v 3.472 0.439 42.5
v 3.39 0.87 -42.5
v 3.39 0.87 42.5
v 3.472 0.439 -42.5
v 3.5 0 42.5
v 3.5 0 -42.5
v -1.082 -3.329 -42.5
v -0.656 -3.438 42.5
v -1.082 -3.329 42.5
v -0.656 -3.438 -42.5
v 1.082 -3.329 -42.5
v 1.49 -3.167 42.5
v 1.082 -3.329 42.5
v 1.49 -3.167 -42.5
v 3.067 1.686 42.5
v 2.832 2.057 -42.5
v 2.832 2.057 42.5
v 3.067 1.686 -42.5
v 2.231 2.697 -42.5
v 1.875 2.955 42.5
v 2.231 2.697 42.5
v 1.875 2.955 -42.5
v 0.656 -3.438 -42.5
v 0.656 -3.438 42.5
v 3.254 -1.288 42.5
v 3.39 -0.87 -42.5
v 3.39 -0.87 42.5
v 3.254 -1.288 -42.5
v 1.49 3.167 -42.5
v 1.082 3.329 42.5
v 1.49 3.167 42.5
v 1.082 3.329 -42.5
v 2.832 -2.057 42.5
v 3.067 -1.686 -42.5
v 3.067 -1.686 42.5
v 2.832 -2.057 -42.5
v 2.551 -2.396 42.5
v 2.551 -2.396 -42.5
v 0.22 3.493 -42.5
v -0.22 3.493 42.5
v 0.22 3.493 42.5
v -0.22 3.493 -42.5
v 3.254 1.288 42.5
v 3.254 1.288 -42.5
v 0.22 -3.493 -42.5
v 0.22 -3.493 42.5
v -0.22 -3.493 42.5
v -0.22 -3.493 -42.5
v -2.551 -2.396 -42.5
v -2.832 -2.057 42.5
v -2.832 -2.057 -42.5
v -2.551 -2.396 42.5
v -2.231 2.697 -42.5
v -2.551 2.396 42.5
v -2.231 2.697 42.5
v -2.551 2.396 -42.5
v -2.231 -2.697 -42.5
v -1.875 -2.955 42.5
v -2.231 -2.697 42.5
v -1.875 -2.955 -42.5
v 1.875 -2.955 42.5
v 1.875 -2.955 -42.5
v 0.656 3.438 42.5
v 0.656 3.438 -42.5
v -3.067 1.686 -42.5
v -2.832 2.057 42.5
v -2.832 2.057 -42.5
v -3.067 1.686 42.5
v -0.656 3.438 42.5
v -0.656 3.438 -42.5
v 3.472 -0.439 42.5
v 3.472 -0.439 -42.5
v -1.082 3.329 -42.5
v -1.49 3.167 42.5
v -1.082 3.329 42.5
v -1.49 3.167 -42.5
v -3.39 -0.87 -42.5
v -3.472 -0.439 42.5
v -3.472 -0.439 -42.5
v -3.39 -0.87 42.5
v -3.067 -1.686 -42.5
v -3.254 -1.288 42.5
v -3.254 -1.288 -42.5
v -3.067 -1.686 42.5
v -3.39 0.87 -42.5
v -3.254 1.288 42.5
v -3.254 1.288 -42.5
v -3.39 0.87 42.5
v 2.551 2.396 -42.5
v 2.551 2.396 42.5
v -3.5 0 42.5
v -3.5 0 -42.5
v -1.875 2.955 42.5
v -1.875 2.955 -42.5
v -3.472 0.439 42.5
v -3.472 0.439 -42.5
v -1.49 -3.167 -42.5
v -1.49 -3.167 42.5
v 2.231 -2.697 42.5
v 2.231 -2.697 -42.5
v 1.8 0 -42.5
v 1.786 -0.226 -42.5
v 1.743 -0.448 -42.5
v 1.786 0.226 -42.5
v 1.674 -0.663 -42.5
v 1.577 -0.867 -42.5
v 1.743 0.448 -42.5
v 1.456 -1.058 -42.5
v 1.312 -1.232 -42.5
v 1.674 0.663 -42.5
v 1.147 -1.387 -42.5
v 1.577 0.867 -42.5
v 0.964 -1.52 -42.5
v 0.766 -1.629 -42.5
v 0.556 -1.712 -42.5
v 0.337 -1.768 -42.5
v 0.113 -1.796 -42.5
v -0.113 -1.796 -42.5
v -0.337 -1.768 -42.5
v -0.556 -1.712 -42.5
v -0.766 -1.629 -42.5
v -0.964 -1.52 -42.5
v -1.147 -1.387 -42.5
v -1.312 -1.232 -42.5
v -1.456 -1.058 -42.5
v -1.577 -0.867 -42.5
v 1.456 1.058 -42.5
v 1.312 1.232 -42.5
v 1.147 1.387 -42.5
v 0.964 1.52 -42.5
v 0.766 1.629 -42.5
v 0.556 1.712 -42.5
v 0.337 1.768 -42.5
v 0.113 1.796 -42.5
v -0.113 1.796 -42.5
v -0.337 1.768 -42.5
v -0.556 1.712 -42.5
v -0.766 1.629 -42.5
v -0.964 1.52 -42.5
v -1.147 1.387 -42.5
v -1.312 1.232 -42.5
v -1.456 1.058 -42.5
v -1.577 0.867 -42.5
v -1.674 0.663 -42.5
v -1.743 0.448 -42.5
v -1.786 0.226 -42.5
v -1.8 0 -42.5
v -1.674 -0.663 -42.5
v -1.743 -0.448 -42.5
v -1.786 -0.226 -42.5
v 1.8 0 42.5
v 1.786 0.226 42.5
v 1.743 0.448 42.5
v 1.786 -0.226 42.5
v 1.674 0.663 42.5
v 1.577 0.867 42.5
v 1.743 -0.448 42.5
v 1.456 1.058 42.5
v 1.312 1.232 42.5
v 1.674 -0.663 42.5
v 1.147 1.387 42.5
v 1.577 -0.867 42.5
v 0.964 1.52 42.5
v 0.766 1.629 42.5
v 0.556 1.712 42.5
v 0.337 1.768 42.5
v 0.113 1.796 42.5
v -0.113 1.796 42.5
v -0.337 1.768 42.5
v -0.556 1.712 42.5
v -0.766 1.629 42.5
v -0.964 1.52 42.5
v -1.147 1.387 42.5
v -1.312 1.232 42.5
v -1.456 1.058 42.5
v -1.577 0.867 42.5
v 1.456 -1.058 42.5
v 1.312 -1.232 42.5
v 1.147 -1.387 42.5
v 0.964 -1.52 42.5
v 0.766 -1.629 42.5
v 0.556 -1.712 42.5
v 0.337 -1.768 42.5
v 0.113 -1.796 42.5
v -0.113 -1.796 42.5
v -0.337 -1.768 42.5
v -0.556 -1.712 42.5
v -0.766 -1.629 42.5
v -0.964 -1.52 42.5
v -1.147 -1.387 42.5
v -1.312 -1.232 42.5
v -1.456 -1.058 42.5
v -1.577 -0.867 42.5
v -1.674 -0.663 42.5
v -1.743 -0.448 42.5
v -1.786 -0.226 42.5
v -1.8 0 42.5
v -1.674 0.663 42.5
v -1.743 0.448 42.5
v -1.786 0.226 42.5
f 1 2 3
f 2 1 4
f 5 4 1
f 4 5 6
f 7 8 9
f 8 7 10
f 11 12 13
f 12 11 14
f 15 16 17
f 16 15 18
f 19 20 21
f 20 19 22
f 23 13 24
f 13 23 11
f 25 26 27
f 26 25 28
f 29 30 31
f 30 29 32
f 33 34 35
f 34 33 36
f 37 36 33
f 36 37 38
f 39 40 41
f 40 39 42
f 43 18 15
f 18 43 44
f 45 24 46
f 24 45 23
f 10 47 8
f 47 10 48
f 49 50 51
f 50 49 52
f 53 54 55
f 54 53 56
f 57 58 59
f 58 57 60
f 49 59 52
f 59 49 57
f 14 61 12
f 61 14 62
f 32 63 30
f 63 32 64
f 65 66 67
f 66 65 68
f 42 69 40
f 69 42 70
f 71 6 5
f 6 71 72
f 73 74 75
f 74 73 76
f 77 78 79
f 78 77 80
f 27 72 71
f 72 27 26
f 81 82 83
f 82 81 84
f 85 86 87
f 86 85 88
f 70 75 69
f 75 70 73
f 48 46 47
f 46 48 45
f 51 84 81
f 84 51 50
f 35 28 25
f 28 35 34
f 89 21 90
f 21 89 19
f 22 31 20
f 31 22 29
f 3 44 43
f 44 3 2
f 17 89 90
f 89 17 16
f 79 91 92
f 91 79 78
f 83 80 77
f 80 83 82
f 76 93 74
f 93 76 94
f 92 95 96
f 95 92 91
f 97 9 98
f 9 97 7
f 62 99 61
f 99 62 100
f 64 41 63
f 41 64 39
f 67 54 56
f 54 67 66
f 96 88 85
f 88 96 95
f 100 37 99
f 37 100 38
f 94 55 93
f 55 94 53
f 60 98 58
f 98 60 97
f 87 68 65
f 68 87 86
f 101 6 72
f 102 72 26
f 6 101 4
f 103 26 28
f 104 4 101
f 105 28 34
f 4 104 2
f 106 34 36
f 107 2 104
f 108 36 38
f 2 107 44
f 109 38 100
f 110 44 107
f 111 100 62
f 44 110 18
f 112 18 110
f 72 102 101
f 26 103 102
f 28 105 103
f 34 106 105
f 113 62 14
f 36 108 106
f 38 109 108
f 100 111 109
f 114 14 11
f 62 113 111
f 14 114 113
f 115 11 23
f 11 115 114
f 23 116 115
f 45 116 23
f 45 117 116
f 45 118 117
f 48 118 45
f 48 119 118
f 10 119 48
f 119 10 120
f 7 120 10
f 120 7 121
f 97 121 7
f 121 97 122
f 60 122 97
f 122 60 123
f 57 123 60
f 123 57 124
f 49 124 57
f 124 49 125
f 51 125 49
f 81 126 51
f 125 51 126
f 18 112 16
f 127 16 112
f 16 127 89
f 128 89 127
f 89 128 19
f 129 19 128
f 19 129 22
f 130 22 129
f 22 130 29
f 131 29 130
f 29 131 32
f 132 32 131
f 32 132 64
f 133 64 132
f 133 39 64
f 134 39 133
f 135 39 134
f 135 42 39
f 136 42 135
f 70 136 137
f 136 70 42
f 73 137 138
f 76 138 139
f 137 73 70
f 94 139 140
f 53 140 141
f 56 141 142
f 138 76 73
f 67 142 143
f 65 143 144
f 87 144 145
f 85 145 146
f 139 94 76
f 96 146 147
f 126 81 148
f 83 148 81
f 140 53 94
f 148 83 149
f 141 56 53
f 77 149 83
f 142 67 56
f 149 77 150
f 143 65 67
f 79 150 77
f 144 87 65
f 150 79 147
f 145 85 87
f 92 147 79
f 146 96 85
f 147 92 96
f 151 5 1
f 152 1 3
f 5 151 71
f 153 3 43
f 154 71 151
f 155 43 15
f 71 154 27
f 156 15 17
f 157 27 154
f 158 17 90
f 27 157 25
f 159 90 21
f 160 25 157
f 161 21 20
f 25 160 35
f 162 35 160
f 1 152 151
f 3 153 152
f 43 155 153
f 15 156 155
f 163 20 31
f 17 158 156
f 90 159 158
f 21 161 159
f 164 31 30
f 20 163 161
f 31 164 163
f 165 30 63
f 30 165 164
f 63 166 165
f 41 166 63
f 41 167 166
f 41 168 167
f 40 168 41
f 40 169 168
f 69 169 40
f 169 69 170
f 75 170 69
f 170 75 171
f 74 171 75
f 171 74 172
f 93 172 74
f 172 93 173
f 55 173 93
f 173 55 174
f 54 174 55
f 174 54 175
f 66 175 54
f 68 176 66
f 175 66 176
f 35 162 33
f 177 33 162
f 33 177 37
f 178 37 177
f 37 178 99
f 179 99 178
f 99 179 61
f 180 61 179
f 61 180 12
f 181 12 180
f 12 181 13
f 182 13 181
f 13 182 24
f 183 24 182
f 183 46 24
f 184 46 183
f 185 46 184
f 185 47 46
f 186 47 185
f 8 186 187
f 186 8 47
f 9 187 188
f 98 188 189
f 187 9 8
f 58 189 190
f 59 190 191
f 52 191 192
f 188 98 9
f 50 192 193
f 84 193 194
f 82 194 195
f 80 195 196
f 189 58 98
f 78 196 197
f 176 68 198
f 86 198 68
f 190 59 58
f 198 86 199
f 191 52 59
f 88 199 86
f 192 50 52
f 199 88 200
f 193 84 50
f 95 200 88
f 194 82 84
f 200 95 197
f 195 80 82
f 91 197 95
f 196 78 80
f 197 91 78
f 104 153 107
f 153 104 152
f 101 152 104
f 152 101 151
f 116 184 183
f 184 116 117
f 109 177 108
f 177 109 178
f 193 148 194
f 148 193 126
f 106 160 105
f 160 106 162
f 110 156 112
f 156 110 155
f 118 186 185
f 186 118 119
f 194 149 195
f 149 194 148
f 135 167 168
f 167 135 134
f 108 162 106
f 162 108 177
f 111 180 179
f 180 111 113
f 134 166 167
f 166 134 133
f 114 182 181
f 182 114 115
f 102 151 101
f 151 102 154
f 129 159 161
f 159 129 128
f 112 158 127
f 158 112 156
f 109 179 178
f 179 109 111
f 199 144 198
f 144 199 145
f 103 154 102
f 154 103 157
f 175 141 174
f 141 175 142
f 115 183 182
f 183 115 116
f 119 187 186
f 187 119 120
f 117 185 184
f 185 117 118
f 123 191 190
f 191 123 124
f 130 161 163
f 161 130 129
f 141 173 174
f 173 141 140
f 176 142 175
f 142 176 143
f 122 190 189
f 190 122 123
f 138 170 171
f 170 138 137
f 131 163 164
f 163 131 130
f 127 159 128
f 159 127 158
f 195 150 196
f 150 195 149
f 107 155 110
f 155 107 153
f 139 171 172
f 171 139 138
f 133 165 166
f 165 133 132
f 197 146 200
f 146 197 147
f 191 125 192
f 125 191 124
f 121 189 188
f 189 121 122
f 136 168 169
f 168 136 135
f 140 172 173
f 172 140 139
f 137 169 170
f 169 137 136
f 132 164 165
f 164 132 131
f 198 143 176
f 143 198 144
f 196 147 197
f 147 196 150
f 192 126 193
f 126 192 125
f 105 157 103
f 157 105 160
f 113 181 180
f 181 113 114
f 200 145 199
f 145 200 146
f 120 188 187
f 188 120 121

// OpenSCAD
$fn = 50;


difference() {
	union() {
		translate(v = [0, 0, -42.5000000000]) {
			cylinder(h = 85, r = 3.5000000000);
		}
	}
	union() {
		#translate(v = [0, 0, -100.0000000000]) {
			cylinder(h = 200, r = 1.8000000000);
		}
	}
}
